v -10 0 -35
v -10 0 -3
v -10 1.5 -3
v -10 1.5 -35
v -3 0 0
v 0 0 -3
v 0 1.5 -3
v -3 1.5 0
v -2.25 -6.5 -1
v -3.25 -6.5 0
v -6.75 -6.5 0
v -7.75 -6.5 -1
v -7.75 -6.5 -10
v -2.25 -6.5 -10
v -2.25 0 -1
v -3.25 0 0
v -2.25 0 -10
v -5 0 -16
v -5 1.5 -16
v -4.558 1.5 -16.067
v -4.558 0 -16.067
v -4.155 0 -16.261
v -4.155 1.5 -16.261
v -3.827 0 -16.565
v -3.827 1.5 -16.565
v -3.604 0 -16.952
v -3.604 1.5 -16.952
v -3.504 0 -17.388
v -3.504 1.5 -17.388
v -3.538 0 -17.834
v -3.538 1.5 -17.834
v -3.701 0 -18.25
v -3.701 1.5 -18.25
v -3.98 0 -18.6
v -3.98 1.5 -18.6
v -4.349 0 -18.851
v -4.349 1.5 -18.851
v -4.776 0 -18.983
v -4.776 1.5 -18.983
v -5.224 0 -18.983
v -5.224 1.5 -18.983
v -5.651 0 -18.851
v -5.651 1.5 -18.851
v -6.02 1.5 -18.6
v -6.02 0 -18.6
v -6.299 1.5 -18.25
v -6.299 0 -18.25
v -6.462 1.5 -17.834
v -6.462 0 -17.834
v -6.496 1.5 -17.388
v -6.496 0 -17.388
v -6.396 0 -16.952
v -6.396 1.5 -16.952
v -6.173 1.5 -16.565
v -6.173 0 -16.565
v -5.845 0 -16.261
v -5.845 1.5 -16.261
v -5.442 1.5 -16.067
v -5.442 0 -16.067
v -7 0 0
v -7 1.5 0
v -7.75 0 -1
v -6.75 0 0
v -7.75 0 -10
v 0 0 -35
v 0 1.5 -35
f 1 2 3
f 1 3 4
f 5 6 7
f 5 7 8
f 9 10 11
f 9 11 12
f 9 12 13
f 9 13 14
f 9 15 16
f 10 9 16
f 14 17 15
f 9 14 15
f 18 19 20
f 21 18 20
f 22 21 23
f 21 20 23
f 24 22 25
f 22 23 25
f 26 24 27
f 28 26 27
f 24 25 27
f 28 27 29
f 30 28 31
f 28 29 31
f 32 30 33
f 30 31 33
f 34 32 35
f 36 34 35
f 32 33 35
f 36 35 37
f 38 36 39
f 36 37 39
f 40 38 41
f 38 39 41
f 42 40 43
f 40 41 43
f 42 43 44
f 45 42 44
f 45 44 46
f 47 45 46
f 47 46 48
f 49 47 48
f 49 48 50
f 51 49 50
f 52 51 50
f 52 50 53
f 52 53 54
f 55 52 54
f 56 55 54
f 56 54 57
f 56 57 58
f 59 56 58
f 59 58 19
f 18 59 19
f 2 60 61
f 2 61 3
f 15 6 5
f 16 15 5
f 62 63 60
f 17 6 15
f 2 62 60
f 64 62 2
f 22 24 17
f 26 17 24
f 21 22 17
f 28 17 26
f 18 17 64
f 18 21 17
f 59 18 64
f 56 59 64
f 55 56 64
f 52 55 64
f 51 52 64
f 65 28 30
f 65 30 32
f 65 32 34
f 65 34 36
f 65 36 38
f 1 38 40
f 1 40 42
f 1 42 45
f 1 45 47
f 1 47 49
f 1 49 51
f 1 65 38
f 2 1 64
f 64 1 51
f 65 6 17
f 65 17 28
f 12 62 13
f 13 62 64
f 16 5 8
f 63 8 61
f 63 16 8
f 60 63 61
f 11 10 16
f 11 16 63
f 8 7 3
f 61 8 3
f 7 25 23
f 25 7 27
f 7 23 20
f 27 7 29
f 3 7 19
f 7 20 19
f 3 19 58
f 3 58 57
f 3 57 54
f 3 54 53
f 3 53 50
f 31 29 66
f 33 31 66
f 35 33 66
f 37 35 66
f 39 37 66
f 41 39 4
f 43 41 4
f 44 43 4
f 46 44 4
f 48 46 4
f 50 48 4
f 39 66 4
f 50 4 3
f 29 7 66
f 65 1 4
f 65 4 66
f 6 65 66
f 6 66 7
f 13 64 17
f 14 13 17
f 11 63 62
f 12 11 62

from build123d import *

# Parameters (mm, degrees)
BOSS_EXTRUDE1_DEPTH = 1.5
BOSS_EXTRUDE2_DEPTH = 6.5
SKETCH3_R           = 1.5
CUT_EXTRUDE1_DEPTH  = 6.5


with BuildPart() as part:
    # Sketch1 → Boss-Extrude1 (new body)
    with BuildSketch(Plane(origin=(0, 0, 0), x_dir=(1, 0, 0), z_dir=(0, 1, 0))):
        Polygon((-7, 0), (-10, 3), (-10, 35), (0, 35), (0, 3), (-3, 0), align=None)
    extrude(amount=BOSS_EXTRUDE1_DEPTH)

    # Sketch2 → Boss-Extrude2 (add)
    with BuildSketch(Plane.XZ):
        Polygon((-3.25, 0), (-6.75, 0), (-7.75, -1), (-7.75, -10), (-2.25, -10), (-2.25, -1), align=None)
    extrude(amount=BOSS_EXTRUDE2_DEPTH)

    # Sketch3 → Cut-Extrude1 (cut)
    with BuildSketch(Plane(origin=(0, 1.5, 0), x_dir=(1, 0, 0), z_dir=(0, 1, 0))):
        with Locations(Location((-5, 17.5, 0), (0, 0, 270))):
            Circle(SKETCH3_R)
    extrude(amount=-CUT_EXTRUDE1_DEPTH, mode=Mode.SUBTRACT)


solid = part.part
